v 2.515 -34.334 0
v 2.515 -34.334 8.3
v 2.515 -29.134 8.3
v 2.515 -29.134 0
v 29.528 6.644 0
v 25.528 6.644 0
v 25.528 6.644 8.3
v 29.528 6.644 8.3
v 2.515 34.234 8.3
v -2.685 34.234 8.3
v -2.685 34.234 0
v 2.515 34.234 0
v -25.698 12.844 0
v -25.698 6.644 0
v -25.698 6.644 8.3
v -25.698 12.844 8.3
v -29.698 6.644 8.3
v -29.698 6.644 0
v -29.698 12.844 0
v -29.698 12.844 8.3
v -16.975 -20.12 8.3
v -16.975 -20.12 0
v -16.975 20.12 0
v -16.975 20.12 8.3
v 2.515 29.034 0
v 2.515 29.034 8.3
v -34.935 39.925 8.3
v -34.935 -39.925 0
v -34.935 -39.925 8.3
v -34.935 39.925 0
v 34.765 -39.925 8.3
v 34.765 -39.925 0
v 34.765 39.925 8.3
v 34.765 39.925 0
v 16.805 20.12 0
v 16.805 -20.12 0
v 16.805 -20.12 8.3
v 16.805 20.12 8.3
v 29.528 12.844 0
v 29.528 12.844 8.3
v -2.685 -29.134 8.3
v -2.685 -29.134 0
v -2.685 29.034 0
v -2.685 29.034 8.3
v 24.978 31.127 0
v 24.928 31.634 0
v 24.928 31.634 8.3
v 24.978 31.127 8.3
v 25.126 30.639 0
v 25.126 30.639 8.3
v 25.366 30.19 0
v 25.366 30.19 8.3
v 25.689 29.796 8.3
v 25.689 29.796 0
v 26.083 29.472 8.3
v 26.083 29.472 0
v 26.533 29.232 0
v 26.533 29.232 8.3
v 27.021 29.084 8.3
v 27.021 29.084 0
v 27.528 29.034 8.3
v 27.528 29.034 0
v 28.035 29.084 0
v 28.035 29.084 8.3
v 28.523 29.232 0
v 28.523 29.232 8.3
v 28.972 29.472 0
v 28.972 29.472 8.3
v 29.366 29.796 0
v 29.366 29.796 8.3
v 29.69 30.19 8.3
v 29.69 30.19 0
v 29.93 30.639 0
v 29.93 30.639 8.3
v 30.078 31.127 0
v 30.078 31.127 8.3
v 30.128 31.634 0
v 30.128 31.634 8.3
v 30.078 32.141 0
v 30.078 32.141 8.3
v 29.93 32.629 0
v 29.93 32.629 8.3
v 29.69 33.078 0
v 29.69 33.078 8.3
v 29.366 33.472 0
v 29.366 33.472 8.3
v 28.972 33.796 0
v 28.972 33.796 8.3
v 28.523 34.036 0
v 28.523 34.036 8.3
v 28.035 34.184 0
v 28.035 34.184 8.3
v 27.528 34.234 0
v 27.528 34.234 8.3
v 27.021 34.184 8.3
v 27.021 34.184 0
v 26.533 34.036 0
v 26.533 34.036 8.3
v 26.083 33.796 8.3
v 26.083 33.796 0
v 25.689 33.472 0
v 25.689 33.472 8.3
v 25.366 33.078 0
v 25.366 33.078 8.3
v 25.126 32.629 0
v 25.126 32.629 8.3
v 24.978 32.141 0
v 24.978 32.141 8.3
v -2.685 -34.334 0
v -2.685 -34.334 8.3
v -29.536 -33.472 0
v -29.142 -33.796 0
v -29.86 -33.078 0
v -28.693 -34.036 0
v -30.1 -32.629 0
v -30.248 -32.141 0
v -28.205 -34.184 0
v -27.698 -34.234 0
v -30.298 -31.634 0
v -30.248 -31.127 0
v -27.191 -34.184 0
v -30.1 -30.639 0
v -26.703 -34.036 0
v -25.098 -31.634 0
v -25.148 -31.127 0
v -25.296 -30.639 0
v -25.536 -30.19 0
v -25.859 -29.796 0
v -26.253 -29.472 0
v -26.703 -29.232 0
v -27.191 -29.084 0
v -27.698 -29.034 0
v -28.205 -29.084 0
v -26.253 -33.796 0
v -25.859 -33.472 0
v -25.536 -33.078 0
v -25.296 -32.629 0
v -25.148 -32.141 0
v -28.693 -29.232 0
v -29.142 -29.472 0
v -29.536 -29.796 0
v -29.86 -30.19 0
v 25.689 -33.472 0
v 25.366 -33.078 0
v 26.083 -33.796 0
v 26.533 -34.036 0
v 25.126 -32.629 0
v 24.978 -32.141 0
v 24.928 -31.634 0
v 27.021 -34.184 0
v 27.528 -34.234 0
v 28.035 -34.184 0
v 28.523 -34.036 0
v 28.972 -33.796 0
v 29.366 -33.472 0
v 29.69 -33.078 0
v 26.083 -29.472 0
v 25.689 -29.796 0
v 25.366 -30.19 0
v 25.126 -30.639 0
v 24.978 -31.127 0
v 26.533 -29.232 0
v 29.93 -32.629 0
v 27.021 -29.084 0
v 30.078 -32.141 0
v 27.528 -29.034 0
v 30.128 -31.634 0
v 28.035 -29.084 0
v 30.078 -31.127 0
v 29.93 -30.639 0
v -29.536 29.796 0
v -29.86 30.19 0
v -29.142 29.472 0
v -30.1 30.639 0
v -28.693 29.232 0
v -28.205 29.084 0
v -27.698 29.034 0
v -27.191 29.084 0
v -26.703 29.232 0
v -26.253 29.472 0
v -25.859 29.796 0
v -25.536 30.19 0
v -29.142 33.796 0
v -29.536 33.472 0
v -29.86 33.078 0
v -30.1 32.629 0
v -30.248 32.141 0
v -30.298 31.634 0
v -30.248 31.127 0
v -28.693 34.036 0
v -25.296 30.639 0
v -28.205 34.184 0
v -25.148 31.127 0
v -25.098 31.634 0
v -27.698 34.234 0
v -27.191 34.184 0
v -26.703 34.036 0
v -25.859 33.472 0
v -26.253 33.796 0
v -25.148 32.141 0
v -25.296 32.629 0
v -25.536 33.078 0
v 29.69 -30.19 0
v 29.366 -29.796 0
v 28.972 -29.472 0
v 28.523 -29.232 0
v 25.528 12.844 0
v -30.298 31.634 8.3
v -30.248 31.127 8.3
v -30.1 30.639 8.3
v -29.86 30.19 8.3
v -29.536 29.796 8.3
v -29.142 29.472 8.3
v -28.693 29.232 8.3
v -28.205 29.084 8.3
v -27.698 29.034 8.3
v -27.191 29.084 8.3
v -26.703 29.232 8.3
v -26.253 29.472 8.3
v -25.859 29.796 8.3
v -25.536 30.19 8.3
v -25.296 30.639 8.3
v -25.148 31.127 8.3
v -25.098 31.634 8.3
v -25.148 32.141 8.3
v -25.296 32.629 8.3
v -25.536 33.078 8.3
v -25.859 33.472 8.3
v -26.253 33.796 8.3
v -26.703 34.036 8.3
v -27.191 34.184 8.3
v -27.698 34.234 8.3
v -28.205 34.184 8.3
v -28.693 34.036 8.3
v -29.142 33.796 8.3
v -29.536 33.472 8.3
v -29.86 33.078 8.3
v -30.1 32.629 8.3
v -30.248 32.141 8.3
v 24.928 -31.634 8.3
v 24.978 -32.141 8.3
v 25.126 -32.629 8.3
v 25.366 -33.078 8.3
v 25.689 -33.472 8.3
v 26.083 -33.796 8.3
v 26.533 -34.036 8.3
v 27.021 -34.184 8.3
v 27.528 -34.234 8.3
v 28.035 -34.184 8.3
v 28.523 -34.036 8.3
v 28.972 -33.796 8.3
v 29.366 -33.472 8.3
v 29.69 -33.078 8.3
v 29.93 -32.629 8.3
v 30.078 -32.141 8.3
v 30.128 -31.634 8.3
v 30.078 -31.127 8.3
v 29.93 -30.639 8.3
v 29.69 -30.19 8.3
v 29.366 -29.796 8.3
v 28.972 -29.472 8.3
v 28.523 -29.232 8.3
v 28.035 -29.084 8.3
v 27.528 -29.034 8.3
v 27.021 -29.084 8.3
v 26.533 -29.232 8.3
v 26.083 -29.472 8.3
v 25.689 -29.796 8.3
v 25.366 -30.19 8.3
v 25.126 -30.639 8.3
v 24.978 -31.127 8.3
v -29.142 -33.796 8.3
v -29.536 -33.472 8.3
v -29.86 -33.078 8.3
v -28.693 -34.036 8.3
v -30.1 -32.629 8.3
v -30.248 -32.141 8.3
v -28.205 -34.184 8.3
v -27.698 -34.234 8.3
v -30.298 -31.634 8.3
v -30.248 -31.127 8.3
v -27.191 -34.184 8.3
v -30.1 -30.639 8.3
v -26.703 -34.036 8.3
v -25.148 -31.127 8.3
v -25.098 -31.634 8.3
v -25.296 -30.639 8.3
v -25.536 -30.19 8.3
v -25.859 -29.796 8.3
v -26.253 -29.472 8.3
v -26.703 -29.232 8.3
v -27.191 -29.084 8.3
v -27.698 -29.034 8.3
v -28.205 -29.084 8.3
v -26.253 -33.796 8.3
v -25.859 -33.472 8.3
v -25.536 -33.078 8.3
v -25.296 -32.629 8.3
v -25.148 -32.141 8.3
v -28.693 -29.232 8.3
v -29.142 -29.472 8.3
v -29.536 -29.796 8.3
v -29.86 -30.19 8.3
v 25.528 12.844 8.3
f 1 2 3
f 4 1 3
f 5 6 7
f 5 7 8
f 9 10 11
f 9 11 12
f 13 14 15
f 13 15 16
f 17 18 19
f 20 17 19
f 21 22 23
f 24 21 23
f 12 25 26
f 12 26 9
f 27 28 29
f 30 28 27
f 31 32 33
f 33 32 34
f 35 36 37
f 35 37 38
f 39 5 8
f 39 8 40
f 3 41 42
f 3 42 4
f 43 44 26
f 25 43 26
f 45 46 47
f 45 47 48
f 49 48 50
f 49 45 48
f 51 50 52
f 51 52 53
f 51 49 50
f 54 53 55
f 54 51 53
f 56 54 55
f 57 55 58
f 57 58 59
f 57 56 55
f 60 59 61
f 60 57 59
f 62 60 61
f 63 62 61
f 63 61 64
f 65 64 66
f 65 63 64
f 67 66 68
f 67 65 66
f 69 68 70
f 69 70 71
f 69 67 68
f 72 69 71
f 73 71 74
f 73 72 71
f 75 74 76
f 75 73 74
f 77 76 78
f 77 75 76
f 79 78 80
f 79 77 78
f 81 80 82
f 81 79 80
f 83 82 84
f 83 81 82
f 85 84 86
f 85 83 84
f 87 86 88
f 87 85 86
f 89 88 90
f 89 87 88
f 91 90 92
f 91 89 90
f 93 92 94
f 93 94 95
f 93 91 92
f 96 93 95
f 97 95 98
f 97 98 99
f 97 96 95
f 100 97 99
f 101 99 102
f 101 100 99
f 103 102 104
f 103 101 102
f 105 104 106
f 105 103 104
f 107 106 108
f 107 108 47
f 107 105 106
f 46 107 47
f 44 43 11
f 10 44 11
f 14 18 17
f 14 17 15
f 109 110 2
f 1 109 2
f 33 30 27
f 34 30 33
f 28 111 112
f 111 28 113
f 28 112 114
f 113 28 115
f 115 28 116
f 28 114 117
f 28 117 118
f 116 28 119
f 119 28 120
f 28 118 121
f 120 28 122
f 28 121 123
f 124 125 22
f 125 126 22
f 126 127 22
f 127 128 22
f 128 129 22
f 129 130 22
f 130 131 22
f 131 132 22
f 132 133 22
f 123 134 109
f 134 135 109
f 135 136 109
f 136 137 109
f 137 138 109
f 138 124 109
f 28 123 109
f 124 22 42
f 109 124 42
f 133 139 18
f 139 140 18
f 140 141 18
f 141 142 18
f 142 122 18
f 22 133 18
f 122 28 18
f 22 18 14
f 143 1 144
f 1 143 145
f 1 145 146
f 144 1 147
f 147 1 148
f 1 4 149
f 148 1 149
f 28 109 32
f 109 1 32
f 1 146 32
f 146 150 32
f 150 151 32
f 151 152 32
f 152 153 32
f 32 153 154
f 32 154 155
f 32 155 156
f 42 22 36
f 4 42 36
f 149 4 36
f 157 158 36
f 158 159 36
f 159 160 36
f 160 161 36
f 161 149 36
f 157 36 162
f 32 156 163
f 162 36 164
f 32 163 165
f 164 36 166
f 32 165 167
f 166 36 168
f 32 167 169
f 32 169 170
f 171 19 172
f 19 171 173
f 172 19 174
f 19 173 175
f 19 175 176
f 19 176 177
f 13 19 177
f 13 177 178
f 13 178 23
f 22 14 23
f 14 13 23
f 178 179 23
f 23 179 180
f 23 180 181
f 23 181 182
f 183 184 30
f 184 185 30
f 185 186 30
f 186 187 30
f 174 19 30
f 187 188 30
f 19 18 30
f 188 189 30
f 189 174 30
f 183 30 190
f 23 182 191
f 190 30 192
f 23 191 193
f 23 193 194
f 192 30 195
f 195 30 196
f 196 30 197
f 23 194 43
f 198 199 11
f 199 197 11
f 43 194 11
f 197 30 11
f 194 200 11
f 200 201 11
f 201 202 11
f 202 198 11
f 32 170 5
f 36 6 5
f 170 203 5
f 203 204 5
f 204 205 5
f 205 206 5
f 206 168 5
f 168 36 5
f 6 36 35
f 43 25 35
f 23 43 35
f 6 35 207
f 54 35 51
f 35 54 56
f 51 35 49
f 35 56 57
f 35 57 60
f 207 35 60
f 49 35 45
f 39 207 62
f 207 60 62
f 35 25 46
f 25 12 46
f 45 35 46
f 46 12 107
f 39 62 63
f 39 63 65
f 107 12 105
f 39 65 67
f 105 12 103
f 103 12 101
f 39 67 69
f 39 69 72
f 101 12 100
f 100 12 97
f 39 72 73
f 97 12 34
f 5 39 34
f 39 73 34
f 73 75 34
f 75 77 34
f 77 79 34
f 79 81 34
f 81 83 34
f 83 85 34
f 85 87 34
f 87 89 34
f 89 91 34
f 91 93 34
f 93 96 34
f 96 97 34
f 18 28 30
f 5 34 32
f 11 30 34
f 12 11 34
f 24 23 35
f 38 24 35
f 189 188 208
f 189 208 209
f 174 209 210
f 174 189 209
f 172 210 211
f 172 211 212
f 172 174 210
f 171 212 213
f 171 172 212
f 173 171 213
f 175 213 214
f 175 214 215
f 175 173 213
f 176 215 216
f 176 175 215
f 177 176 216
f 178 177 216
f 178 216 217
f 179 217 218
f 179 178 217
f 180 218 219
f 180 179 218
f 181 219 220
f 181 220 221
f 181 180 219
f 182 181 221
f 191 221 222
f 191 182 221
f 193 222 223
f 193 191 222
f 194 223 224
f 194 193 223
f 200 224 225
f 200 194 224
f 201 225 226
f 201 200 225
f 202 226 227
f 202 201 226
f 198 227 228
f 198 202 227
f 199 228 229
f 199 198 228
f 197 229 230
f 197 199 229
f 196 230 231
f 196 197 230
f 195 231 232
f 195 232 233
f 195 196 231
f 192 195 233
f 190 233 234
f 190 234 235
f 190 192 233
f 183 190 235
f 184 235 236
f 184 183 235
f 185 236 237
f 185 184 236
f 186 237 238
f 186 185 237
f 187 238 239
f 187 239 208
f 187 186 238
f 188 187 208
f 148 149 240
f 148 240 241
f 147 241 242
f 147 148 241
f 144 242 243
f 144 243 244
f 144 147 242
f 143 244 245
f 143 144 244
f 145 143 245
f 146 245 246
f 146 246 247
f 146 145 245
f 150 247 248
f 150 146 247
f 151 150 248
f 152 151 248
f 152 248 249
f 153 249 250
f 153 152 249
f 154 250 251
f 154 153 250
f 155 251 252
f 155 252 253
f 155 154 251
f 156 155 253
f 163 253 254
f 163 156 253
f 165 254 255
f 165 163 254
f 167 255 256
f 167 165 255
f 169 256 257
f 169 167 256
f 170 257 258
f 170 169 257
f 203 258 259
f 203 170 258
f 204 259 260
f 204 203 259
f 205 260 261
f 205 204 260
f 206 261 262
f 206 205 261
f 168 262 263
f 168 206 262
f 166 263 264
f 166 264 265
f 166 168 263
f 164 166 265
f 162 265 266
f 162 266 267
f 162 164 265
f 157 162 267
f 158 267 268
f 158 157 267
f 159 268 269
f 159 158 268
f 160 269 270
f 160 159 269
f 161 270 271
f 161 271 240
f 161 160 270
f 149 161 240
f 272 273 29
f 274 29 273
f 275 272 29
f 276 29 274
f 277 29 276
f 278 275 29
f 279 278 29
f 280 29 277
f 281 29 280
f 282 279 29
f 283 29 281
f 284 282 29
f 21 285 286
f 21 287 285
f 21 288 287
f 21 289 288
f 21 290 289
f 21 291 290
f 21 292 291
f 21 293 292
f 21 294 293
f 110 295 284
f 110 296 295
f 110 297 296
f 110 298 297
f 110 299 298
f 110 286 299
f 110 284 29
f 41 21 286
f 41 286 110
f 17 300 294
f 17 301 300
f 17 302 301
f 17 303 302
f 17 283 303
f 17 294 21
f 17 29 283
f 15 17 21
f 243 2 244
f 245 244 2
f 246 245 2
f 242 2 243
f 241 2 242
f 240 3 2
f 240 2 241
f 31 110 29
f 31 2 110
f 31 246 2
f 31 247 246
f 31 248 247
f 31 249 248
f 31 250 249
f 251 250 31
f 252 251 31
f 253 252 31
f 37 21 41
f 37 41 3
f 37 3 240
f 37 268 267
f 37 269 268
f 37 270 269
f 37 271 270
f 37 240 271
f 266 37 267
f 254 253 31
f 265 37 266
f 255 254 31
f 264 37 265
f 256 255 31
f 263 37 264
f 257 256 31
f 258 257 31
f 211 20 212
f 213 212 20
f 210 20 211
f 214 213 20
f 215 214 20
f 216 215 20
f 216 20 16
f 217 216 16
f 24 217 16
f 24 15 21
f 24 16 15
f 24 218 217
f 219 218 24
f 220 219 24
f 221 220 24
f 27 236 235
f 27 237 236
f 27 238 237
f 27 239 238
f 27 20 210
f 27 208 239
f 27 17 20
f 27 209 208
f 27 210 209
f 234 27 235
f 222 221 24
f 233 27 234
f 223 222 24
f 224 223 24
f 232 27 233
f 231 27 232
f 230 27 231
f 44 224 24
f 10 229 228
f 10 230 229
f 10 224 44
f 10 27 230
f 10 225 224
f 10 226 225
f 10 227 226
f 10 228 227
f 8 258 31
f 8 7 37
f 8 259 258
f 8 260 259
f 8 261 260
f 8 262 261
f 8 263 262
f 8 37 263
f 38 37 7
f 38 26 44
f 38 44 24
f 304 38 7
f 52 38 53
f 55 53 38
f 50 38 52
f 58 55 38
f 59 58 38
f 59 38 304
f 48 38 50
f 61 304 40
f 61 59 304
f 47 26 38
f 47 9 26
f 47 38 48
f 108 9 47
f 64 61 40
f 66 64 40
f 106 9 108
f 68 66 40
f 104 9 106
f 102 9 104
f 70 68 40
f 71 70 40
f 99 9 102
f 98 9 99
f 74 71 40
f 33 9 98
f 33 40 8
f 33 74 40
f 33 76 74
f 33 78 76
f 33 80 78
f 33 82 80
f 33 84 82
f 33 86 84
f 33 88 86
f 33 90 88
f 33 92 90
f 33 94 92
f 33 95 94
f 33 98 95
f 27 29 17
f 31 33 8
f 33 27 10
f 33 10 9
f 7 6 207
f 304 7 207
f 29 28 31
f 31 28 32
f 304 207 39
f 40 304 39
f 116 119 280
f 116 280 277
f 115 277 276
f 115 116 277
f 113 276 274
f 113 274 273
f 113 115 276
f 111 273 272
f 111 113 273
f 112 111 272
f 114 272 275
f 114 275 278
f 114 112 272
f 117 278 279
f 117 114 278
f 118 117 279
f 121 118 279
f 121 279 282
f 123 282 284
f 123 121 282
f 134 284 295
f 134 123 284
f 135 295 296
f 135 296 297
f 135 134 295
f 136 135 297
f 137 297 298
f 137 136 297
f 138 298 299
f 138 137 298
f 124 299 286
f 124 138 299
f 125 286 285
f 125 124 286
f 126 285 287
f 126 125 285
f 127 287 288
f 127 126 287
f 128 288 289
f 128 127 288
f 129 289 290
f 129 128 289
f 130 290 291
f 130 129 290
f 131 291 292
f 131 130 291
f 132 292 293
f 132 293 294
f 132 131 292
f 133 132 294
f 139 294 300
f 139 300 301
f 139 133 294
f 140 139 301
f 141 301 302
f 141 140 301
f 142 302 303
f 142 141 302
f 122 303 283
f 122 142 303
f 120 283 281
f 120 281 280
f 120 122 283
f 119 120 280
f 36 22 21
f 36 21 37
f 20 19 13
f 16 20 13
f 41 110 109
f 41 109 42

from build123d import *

# Parameters (mm, degrees)
SKETCH_1_W          = 69.7
SKETCH_1_H          = 79.85
SKETCH_1_R          = 2.6
SKETCH_1_W_2        = 33.78
SKETCH_1_H_2        = 40.24
SKETCH_1_W_3        = 4
SKETCH_1_H_3        = 6.2
EXTRUDE_1_DEPTH     = 8.3
SKETCH_3_W          = 5.2
SKETCH_3_H          = 5.2
CUT_EXTRUDE_1_DEPTH = 10
SKETCH_5_W          = 5.2
SKETCH_5_H          = 5.2
CUT_EXTRUDE_2_DEPTH = 10


with BuildPart() as part:
    # Эскиз1 → Бобышка-Вытянуть1 (new body)
    with BuildSketch(Plane.XY):
        with Locations((-0.085003009, 0)):
            Rectangle(SKETCH_1_W, SKETCH_1_H)
        with Locations(Location((-27.697888562, 31.633987252, 0), (0, 0, 180))):
            Circle(SKETCH_1_R, mode=Mode.SUBTRACT)
        with Locations(Location((-27.697888562, -31.633987252, 0), (0, 0, 180))):
            Circle(SKETCH_1_R, mode=Mode.SUBTRACT)
        with Locations(Location((27.527882545, -31.633987252, 0), (0, 0, 180))):
            Circle(SKETCH_1_R, mode=Mode.SUBTRACT)
        with Locations(Location((27.527882545, 31.633987252, 0), (0, 0, 180))):
            Circle(SKETCH_1_R, mode=Mode.SUBTRACT)
        with Locations((-0.085003009, 0)):
            Rectangle(SKETCH_1_W_2, SKETCH_1_H_2, mode=Mode.SUBTRACT)
        with Locations((-27.697888562, 9.743987252)):
            Rectangle(SKETCH_1_W_3, SKETCH_1_H_3, mode=Mode.SUBTRACT)
        with Locations((27.527882545, 9.743987252)):
            Rectangle(SKETCH_1_W_3, SKETCH_1_H_3, mode=Mode.SUBTRACT)
    extrude(amount=EXTRUDE_1_DEPTH)

    # Эскиз3 → Вырез-Вытянуть1 (cut)
    with BuildSketch(Plane.XY.offset(8.3)):
        with Locations((-0.085003009, -31.733803261)):
            Rectangle(SKETCH_3_W, SKETCH_3_H)
    extrude(amount=-CUT_EXTRUDE_1_DEPTH, mode=Mode.SUBTRACT)

    # Эскиз5 → Вырез-Вытянуть2 (cut)
    with BuildSketch(Plane.XY.offset(8.3)):
        with Locations((-0.085003009, 31.633987252)):
            Rectangle(SKETCH_5_W, SKETCH_5_H)
    extrude(amount=-CUT_EXTRUDE_2_DEPTH, mode=Mode.SUBTRACT)


solid = part.part
